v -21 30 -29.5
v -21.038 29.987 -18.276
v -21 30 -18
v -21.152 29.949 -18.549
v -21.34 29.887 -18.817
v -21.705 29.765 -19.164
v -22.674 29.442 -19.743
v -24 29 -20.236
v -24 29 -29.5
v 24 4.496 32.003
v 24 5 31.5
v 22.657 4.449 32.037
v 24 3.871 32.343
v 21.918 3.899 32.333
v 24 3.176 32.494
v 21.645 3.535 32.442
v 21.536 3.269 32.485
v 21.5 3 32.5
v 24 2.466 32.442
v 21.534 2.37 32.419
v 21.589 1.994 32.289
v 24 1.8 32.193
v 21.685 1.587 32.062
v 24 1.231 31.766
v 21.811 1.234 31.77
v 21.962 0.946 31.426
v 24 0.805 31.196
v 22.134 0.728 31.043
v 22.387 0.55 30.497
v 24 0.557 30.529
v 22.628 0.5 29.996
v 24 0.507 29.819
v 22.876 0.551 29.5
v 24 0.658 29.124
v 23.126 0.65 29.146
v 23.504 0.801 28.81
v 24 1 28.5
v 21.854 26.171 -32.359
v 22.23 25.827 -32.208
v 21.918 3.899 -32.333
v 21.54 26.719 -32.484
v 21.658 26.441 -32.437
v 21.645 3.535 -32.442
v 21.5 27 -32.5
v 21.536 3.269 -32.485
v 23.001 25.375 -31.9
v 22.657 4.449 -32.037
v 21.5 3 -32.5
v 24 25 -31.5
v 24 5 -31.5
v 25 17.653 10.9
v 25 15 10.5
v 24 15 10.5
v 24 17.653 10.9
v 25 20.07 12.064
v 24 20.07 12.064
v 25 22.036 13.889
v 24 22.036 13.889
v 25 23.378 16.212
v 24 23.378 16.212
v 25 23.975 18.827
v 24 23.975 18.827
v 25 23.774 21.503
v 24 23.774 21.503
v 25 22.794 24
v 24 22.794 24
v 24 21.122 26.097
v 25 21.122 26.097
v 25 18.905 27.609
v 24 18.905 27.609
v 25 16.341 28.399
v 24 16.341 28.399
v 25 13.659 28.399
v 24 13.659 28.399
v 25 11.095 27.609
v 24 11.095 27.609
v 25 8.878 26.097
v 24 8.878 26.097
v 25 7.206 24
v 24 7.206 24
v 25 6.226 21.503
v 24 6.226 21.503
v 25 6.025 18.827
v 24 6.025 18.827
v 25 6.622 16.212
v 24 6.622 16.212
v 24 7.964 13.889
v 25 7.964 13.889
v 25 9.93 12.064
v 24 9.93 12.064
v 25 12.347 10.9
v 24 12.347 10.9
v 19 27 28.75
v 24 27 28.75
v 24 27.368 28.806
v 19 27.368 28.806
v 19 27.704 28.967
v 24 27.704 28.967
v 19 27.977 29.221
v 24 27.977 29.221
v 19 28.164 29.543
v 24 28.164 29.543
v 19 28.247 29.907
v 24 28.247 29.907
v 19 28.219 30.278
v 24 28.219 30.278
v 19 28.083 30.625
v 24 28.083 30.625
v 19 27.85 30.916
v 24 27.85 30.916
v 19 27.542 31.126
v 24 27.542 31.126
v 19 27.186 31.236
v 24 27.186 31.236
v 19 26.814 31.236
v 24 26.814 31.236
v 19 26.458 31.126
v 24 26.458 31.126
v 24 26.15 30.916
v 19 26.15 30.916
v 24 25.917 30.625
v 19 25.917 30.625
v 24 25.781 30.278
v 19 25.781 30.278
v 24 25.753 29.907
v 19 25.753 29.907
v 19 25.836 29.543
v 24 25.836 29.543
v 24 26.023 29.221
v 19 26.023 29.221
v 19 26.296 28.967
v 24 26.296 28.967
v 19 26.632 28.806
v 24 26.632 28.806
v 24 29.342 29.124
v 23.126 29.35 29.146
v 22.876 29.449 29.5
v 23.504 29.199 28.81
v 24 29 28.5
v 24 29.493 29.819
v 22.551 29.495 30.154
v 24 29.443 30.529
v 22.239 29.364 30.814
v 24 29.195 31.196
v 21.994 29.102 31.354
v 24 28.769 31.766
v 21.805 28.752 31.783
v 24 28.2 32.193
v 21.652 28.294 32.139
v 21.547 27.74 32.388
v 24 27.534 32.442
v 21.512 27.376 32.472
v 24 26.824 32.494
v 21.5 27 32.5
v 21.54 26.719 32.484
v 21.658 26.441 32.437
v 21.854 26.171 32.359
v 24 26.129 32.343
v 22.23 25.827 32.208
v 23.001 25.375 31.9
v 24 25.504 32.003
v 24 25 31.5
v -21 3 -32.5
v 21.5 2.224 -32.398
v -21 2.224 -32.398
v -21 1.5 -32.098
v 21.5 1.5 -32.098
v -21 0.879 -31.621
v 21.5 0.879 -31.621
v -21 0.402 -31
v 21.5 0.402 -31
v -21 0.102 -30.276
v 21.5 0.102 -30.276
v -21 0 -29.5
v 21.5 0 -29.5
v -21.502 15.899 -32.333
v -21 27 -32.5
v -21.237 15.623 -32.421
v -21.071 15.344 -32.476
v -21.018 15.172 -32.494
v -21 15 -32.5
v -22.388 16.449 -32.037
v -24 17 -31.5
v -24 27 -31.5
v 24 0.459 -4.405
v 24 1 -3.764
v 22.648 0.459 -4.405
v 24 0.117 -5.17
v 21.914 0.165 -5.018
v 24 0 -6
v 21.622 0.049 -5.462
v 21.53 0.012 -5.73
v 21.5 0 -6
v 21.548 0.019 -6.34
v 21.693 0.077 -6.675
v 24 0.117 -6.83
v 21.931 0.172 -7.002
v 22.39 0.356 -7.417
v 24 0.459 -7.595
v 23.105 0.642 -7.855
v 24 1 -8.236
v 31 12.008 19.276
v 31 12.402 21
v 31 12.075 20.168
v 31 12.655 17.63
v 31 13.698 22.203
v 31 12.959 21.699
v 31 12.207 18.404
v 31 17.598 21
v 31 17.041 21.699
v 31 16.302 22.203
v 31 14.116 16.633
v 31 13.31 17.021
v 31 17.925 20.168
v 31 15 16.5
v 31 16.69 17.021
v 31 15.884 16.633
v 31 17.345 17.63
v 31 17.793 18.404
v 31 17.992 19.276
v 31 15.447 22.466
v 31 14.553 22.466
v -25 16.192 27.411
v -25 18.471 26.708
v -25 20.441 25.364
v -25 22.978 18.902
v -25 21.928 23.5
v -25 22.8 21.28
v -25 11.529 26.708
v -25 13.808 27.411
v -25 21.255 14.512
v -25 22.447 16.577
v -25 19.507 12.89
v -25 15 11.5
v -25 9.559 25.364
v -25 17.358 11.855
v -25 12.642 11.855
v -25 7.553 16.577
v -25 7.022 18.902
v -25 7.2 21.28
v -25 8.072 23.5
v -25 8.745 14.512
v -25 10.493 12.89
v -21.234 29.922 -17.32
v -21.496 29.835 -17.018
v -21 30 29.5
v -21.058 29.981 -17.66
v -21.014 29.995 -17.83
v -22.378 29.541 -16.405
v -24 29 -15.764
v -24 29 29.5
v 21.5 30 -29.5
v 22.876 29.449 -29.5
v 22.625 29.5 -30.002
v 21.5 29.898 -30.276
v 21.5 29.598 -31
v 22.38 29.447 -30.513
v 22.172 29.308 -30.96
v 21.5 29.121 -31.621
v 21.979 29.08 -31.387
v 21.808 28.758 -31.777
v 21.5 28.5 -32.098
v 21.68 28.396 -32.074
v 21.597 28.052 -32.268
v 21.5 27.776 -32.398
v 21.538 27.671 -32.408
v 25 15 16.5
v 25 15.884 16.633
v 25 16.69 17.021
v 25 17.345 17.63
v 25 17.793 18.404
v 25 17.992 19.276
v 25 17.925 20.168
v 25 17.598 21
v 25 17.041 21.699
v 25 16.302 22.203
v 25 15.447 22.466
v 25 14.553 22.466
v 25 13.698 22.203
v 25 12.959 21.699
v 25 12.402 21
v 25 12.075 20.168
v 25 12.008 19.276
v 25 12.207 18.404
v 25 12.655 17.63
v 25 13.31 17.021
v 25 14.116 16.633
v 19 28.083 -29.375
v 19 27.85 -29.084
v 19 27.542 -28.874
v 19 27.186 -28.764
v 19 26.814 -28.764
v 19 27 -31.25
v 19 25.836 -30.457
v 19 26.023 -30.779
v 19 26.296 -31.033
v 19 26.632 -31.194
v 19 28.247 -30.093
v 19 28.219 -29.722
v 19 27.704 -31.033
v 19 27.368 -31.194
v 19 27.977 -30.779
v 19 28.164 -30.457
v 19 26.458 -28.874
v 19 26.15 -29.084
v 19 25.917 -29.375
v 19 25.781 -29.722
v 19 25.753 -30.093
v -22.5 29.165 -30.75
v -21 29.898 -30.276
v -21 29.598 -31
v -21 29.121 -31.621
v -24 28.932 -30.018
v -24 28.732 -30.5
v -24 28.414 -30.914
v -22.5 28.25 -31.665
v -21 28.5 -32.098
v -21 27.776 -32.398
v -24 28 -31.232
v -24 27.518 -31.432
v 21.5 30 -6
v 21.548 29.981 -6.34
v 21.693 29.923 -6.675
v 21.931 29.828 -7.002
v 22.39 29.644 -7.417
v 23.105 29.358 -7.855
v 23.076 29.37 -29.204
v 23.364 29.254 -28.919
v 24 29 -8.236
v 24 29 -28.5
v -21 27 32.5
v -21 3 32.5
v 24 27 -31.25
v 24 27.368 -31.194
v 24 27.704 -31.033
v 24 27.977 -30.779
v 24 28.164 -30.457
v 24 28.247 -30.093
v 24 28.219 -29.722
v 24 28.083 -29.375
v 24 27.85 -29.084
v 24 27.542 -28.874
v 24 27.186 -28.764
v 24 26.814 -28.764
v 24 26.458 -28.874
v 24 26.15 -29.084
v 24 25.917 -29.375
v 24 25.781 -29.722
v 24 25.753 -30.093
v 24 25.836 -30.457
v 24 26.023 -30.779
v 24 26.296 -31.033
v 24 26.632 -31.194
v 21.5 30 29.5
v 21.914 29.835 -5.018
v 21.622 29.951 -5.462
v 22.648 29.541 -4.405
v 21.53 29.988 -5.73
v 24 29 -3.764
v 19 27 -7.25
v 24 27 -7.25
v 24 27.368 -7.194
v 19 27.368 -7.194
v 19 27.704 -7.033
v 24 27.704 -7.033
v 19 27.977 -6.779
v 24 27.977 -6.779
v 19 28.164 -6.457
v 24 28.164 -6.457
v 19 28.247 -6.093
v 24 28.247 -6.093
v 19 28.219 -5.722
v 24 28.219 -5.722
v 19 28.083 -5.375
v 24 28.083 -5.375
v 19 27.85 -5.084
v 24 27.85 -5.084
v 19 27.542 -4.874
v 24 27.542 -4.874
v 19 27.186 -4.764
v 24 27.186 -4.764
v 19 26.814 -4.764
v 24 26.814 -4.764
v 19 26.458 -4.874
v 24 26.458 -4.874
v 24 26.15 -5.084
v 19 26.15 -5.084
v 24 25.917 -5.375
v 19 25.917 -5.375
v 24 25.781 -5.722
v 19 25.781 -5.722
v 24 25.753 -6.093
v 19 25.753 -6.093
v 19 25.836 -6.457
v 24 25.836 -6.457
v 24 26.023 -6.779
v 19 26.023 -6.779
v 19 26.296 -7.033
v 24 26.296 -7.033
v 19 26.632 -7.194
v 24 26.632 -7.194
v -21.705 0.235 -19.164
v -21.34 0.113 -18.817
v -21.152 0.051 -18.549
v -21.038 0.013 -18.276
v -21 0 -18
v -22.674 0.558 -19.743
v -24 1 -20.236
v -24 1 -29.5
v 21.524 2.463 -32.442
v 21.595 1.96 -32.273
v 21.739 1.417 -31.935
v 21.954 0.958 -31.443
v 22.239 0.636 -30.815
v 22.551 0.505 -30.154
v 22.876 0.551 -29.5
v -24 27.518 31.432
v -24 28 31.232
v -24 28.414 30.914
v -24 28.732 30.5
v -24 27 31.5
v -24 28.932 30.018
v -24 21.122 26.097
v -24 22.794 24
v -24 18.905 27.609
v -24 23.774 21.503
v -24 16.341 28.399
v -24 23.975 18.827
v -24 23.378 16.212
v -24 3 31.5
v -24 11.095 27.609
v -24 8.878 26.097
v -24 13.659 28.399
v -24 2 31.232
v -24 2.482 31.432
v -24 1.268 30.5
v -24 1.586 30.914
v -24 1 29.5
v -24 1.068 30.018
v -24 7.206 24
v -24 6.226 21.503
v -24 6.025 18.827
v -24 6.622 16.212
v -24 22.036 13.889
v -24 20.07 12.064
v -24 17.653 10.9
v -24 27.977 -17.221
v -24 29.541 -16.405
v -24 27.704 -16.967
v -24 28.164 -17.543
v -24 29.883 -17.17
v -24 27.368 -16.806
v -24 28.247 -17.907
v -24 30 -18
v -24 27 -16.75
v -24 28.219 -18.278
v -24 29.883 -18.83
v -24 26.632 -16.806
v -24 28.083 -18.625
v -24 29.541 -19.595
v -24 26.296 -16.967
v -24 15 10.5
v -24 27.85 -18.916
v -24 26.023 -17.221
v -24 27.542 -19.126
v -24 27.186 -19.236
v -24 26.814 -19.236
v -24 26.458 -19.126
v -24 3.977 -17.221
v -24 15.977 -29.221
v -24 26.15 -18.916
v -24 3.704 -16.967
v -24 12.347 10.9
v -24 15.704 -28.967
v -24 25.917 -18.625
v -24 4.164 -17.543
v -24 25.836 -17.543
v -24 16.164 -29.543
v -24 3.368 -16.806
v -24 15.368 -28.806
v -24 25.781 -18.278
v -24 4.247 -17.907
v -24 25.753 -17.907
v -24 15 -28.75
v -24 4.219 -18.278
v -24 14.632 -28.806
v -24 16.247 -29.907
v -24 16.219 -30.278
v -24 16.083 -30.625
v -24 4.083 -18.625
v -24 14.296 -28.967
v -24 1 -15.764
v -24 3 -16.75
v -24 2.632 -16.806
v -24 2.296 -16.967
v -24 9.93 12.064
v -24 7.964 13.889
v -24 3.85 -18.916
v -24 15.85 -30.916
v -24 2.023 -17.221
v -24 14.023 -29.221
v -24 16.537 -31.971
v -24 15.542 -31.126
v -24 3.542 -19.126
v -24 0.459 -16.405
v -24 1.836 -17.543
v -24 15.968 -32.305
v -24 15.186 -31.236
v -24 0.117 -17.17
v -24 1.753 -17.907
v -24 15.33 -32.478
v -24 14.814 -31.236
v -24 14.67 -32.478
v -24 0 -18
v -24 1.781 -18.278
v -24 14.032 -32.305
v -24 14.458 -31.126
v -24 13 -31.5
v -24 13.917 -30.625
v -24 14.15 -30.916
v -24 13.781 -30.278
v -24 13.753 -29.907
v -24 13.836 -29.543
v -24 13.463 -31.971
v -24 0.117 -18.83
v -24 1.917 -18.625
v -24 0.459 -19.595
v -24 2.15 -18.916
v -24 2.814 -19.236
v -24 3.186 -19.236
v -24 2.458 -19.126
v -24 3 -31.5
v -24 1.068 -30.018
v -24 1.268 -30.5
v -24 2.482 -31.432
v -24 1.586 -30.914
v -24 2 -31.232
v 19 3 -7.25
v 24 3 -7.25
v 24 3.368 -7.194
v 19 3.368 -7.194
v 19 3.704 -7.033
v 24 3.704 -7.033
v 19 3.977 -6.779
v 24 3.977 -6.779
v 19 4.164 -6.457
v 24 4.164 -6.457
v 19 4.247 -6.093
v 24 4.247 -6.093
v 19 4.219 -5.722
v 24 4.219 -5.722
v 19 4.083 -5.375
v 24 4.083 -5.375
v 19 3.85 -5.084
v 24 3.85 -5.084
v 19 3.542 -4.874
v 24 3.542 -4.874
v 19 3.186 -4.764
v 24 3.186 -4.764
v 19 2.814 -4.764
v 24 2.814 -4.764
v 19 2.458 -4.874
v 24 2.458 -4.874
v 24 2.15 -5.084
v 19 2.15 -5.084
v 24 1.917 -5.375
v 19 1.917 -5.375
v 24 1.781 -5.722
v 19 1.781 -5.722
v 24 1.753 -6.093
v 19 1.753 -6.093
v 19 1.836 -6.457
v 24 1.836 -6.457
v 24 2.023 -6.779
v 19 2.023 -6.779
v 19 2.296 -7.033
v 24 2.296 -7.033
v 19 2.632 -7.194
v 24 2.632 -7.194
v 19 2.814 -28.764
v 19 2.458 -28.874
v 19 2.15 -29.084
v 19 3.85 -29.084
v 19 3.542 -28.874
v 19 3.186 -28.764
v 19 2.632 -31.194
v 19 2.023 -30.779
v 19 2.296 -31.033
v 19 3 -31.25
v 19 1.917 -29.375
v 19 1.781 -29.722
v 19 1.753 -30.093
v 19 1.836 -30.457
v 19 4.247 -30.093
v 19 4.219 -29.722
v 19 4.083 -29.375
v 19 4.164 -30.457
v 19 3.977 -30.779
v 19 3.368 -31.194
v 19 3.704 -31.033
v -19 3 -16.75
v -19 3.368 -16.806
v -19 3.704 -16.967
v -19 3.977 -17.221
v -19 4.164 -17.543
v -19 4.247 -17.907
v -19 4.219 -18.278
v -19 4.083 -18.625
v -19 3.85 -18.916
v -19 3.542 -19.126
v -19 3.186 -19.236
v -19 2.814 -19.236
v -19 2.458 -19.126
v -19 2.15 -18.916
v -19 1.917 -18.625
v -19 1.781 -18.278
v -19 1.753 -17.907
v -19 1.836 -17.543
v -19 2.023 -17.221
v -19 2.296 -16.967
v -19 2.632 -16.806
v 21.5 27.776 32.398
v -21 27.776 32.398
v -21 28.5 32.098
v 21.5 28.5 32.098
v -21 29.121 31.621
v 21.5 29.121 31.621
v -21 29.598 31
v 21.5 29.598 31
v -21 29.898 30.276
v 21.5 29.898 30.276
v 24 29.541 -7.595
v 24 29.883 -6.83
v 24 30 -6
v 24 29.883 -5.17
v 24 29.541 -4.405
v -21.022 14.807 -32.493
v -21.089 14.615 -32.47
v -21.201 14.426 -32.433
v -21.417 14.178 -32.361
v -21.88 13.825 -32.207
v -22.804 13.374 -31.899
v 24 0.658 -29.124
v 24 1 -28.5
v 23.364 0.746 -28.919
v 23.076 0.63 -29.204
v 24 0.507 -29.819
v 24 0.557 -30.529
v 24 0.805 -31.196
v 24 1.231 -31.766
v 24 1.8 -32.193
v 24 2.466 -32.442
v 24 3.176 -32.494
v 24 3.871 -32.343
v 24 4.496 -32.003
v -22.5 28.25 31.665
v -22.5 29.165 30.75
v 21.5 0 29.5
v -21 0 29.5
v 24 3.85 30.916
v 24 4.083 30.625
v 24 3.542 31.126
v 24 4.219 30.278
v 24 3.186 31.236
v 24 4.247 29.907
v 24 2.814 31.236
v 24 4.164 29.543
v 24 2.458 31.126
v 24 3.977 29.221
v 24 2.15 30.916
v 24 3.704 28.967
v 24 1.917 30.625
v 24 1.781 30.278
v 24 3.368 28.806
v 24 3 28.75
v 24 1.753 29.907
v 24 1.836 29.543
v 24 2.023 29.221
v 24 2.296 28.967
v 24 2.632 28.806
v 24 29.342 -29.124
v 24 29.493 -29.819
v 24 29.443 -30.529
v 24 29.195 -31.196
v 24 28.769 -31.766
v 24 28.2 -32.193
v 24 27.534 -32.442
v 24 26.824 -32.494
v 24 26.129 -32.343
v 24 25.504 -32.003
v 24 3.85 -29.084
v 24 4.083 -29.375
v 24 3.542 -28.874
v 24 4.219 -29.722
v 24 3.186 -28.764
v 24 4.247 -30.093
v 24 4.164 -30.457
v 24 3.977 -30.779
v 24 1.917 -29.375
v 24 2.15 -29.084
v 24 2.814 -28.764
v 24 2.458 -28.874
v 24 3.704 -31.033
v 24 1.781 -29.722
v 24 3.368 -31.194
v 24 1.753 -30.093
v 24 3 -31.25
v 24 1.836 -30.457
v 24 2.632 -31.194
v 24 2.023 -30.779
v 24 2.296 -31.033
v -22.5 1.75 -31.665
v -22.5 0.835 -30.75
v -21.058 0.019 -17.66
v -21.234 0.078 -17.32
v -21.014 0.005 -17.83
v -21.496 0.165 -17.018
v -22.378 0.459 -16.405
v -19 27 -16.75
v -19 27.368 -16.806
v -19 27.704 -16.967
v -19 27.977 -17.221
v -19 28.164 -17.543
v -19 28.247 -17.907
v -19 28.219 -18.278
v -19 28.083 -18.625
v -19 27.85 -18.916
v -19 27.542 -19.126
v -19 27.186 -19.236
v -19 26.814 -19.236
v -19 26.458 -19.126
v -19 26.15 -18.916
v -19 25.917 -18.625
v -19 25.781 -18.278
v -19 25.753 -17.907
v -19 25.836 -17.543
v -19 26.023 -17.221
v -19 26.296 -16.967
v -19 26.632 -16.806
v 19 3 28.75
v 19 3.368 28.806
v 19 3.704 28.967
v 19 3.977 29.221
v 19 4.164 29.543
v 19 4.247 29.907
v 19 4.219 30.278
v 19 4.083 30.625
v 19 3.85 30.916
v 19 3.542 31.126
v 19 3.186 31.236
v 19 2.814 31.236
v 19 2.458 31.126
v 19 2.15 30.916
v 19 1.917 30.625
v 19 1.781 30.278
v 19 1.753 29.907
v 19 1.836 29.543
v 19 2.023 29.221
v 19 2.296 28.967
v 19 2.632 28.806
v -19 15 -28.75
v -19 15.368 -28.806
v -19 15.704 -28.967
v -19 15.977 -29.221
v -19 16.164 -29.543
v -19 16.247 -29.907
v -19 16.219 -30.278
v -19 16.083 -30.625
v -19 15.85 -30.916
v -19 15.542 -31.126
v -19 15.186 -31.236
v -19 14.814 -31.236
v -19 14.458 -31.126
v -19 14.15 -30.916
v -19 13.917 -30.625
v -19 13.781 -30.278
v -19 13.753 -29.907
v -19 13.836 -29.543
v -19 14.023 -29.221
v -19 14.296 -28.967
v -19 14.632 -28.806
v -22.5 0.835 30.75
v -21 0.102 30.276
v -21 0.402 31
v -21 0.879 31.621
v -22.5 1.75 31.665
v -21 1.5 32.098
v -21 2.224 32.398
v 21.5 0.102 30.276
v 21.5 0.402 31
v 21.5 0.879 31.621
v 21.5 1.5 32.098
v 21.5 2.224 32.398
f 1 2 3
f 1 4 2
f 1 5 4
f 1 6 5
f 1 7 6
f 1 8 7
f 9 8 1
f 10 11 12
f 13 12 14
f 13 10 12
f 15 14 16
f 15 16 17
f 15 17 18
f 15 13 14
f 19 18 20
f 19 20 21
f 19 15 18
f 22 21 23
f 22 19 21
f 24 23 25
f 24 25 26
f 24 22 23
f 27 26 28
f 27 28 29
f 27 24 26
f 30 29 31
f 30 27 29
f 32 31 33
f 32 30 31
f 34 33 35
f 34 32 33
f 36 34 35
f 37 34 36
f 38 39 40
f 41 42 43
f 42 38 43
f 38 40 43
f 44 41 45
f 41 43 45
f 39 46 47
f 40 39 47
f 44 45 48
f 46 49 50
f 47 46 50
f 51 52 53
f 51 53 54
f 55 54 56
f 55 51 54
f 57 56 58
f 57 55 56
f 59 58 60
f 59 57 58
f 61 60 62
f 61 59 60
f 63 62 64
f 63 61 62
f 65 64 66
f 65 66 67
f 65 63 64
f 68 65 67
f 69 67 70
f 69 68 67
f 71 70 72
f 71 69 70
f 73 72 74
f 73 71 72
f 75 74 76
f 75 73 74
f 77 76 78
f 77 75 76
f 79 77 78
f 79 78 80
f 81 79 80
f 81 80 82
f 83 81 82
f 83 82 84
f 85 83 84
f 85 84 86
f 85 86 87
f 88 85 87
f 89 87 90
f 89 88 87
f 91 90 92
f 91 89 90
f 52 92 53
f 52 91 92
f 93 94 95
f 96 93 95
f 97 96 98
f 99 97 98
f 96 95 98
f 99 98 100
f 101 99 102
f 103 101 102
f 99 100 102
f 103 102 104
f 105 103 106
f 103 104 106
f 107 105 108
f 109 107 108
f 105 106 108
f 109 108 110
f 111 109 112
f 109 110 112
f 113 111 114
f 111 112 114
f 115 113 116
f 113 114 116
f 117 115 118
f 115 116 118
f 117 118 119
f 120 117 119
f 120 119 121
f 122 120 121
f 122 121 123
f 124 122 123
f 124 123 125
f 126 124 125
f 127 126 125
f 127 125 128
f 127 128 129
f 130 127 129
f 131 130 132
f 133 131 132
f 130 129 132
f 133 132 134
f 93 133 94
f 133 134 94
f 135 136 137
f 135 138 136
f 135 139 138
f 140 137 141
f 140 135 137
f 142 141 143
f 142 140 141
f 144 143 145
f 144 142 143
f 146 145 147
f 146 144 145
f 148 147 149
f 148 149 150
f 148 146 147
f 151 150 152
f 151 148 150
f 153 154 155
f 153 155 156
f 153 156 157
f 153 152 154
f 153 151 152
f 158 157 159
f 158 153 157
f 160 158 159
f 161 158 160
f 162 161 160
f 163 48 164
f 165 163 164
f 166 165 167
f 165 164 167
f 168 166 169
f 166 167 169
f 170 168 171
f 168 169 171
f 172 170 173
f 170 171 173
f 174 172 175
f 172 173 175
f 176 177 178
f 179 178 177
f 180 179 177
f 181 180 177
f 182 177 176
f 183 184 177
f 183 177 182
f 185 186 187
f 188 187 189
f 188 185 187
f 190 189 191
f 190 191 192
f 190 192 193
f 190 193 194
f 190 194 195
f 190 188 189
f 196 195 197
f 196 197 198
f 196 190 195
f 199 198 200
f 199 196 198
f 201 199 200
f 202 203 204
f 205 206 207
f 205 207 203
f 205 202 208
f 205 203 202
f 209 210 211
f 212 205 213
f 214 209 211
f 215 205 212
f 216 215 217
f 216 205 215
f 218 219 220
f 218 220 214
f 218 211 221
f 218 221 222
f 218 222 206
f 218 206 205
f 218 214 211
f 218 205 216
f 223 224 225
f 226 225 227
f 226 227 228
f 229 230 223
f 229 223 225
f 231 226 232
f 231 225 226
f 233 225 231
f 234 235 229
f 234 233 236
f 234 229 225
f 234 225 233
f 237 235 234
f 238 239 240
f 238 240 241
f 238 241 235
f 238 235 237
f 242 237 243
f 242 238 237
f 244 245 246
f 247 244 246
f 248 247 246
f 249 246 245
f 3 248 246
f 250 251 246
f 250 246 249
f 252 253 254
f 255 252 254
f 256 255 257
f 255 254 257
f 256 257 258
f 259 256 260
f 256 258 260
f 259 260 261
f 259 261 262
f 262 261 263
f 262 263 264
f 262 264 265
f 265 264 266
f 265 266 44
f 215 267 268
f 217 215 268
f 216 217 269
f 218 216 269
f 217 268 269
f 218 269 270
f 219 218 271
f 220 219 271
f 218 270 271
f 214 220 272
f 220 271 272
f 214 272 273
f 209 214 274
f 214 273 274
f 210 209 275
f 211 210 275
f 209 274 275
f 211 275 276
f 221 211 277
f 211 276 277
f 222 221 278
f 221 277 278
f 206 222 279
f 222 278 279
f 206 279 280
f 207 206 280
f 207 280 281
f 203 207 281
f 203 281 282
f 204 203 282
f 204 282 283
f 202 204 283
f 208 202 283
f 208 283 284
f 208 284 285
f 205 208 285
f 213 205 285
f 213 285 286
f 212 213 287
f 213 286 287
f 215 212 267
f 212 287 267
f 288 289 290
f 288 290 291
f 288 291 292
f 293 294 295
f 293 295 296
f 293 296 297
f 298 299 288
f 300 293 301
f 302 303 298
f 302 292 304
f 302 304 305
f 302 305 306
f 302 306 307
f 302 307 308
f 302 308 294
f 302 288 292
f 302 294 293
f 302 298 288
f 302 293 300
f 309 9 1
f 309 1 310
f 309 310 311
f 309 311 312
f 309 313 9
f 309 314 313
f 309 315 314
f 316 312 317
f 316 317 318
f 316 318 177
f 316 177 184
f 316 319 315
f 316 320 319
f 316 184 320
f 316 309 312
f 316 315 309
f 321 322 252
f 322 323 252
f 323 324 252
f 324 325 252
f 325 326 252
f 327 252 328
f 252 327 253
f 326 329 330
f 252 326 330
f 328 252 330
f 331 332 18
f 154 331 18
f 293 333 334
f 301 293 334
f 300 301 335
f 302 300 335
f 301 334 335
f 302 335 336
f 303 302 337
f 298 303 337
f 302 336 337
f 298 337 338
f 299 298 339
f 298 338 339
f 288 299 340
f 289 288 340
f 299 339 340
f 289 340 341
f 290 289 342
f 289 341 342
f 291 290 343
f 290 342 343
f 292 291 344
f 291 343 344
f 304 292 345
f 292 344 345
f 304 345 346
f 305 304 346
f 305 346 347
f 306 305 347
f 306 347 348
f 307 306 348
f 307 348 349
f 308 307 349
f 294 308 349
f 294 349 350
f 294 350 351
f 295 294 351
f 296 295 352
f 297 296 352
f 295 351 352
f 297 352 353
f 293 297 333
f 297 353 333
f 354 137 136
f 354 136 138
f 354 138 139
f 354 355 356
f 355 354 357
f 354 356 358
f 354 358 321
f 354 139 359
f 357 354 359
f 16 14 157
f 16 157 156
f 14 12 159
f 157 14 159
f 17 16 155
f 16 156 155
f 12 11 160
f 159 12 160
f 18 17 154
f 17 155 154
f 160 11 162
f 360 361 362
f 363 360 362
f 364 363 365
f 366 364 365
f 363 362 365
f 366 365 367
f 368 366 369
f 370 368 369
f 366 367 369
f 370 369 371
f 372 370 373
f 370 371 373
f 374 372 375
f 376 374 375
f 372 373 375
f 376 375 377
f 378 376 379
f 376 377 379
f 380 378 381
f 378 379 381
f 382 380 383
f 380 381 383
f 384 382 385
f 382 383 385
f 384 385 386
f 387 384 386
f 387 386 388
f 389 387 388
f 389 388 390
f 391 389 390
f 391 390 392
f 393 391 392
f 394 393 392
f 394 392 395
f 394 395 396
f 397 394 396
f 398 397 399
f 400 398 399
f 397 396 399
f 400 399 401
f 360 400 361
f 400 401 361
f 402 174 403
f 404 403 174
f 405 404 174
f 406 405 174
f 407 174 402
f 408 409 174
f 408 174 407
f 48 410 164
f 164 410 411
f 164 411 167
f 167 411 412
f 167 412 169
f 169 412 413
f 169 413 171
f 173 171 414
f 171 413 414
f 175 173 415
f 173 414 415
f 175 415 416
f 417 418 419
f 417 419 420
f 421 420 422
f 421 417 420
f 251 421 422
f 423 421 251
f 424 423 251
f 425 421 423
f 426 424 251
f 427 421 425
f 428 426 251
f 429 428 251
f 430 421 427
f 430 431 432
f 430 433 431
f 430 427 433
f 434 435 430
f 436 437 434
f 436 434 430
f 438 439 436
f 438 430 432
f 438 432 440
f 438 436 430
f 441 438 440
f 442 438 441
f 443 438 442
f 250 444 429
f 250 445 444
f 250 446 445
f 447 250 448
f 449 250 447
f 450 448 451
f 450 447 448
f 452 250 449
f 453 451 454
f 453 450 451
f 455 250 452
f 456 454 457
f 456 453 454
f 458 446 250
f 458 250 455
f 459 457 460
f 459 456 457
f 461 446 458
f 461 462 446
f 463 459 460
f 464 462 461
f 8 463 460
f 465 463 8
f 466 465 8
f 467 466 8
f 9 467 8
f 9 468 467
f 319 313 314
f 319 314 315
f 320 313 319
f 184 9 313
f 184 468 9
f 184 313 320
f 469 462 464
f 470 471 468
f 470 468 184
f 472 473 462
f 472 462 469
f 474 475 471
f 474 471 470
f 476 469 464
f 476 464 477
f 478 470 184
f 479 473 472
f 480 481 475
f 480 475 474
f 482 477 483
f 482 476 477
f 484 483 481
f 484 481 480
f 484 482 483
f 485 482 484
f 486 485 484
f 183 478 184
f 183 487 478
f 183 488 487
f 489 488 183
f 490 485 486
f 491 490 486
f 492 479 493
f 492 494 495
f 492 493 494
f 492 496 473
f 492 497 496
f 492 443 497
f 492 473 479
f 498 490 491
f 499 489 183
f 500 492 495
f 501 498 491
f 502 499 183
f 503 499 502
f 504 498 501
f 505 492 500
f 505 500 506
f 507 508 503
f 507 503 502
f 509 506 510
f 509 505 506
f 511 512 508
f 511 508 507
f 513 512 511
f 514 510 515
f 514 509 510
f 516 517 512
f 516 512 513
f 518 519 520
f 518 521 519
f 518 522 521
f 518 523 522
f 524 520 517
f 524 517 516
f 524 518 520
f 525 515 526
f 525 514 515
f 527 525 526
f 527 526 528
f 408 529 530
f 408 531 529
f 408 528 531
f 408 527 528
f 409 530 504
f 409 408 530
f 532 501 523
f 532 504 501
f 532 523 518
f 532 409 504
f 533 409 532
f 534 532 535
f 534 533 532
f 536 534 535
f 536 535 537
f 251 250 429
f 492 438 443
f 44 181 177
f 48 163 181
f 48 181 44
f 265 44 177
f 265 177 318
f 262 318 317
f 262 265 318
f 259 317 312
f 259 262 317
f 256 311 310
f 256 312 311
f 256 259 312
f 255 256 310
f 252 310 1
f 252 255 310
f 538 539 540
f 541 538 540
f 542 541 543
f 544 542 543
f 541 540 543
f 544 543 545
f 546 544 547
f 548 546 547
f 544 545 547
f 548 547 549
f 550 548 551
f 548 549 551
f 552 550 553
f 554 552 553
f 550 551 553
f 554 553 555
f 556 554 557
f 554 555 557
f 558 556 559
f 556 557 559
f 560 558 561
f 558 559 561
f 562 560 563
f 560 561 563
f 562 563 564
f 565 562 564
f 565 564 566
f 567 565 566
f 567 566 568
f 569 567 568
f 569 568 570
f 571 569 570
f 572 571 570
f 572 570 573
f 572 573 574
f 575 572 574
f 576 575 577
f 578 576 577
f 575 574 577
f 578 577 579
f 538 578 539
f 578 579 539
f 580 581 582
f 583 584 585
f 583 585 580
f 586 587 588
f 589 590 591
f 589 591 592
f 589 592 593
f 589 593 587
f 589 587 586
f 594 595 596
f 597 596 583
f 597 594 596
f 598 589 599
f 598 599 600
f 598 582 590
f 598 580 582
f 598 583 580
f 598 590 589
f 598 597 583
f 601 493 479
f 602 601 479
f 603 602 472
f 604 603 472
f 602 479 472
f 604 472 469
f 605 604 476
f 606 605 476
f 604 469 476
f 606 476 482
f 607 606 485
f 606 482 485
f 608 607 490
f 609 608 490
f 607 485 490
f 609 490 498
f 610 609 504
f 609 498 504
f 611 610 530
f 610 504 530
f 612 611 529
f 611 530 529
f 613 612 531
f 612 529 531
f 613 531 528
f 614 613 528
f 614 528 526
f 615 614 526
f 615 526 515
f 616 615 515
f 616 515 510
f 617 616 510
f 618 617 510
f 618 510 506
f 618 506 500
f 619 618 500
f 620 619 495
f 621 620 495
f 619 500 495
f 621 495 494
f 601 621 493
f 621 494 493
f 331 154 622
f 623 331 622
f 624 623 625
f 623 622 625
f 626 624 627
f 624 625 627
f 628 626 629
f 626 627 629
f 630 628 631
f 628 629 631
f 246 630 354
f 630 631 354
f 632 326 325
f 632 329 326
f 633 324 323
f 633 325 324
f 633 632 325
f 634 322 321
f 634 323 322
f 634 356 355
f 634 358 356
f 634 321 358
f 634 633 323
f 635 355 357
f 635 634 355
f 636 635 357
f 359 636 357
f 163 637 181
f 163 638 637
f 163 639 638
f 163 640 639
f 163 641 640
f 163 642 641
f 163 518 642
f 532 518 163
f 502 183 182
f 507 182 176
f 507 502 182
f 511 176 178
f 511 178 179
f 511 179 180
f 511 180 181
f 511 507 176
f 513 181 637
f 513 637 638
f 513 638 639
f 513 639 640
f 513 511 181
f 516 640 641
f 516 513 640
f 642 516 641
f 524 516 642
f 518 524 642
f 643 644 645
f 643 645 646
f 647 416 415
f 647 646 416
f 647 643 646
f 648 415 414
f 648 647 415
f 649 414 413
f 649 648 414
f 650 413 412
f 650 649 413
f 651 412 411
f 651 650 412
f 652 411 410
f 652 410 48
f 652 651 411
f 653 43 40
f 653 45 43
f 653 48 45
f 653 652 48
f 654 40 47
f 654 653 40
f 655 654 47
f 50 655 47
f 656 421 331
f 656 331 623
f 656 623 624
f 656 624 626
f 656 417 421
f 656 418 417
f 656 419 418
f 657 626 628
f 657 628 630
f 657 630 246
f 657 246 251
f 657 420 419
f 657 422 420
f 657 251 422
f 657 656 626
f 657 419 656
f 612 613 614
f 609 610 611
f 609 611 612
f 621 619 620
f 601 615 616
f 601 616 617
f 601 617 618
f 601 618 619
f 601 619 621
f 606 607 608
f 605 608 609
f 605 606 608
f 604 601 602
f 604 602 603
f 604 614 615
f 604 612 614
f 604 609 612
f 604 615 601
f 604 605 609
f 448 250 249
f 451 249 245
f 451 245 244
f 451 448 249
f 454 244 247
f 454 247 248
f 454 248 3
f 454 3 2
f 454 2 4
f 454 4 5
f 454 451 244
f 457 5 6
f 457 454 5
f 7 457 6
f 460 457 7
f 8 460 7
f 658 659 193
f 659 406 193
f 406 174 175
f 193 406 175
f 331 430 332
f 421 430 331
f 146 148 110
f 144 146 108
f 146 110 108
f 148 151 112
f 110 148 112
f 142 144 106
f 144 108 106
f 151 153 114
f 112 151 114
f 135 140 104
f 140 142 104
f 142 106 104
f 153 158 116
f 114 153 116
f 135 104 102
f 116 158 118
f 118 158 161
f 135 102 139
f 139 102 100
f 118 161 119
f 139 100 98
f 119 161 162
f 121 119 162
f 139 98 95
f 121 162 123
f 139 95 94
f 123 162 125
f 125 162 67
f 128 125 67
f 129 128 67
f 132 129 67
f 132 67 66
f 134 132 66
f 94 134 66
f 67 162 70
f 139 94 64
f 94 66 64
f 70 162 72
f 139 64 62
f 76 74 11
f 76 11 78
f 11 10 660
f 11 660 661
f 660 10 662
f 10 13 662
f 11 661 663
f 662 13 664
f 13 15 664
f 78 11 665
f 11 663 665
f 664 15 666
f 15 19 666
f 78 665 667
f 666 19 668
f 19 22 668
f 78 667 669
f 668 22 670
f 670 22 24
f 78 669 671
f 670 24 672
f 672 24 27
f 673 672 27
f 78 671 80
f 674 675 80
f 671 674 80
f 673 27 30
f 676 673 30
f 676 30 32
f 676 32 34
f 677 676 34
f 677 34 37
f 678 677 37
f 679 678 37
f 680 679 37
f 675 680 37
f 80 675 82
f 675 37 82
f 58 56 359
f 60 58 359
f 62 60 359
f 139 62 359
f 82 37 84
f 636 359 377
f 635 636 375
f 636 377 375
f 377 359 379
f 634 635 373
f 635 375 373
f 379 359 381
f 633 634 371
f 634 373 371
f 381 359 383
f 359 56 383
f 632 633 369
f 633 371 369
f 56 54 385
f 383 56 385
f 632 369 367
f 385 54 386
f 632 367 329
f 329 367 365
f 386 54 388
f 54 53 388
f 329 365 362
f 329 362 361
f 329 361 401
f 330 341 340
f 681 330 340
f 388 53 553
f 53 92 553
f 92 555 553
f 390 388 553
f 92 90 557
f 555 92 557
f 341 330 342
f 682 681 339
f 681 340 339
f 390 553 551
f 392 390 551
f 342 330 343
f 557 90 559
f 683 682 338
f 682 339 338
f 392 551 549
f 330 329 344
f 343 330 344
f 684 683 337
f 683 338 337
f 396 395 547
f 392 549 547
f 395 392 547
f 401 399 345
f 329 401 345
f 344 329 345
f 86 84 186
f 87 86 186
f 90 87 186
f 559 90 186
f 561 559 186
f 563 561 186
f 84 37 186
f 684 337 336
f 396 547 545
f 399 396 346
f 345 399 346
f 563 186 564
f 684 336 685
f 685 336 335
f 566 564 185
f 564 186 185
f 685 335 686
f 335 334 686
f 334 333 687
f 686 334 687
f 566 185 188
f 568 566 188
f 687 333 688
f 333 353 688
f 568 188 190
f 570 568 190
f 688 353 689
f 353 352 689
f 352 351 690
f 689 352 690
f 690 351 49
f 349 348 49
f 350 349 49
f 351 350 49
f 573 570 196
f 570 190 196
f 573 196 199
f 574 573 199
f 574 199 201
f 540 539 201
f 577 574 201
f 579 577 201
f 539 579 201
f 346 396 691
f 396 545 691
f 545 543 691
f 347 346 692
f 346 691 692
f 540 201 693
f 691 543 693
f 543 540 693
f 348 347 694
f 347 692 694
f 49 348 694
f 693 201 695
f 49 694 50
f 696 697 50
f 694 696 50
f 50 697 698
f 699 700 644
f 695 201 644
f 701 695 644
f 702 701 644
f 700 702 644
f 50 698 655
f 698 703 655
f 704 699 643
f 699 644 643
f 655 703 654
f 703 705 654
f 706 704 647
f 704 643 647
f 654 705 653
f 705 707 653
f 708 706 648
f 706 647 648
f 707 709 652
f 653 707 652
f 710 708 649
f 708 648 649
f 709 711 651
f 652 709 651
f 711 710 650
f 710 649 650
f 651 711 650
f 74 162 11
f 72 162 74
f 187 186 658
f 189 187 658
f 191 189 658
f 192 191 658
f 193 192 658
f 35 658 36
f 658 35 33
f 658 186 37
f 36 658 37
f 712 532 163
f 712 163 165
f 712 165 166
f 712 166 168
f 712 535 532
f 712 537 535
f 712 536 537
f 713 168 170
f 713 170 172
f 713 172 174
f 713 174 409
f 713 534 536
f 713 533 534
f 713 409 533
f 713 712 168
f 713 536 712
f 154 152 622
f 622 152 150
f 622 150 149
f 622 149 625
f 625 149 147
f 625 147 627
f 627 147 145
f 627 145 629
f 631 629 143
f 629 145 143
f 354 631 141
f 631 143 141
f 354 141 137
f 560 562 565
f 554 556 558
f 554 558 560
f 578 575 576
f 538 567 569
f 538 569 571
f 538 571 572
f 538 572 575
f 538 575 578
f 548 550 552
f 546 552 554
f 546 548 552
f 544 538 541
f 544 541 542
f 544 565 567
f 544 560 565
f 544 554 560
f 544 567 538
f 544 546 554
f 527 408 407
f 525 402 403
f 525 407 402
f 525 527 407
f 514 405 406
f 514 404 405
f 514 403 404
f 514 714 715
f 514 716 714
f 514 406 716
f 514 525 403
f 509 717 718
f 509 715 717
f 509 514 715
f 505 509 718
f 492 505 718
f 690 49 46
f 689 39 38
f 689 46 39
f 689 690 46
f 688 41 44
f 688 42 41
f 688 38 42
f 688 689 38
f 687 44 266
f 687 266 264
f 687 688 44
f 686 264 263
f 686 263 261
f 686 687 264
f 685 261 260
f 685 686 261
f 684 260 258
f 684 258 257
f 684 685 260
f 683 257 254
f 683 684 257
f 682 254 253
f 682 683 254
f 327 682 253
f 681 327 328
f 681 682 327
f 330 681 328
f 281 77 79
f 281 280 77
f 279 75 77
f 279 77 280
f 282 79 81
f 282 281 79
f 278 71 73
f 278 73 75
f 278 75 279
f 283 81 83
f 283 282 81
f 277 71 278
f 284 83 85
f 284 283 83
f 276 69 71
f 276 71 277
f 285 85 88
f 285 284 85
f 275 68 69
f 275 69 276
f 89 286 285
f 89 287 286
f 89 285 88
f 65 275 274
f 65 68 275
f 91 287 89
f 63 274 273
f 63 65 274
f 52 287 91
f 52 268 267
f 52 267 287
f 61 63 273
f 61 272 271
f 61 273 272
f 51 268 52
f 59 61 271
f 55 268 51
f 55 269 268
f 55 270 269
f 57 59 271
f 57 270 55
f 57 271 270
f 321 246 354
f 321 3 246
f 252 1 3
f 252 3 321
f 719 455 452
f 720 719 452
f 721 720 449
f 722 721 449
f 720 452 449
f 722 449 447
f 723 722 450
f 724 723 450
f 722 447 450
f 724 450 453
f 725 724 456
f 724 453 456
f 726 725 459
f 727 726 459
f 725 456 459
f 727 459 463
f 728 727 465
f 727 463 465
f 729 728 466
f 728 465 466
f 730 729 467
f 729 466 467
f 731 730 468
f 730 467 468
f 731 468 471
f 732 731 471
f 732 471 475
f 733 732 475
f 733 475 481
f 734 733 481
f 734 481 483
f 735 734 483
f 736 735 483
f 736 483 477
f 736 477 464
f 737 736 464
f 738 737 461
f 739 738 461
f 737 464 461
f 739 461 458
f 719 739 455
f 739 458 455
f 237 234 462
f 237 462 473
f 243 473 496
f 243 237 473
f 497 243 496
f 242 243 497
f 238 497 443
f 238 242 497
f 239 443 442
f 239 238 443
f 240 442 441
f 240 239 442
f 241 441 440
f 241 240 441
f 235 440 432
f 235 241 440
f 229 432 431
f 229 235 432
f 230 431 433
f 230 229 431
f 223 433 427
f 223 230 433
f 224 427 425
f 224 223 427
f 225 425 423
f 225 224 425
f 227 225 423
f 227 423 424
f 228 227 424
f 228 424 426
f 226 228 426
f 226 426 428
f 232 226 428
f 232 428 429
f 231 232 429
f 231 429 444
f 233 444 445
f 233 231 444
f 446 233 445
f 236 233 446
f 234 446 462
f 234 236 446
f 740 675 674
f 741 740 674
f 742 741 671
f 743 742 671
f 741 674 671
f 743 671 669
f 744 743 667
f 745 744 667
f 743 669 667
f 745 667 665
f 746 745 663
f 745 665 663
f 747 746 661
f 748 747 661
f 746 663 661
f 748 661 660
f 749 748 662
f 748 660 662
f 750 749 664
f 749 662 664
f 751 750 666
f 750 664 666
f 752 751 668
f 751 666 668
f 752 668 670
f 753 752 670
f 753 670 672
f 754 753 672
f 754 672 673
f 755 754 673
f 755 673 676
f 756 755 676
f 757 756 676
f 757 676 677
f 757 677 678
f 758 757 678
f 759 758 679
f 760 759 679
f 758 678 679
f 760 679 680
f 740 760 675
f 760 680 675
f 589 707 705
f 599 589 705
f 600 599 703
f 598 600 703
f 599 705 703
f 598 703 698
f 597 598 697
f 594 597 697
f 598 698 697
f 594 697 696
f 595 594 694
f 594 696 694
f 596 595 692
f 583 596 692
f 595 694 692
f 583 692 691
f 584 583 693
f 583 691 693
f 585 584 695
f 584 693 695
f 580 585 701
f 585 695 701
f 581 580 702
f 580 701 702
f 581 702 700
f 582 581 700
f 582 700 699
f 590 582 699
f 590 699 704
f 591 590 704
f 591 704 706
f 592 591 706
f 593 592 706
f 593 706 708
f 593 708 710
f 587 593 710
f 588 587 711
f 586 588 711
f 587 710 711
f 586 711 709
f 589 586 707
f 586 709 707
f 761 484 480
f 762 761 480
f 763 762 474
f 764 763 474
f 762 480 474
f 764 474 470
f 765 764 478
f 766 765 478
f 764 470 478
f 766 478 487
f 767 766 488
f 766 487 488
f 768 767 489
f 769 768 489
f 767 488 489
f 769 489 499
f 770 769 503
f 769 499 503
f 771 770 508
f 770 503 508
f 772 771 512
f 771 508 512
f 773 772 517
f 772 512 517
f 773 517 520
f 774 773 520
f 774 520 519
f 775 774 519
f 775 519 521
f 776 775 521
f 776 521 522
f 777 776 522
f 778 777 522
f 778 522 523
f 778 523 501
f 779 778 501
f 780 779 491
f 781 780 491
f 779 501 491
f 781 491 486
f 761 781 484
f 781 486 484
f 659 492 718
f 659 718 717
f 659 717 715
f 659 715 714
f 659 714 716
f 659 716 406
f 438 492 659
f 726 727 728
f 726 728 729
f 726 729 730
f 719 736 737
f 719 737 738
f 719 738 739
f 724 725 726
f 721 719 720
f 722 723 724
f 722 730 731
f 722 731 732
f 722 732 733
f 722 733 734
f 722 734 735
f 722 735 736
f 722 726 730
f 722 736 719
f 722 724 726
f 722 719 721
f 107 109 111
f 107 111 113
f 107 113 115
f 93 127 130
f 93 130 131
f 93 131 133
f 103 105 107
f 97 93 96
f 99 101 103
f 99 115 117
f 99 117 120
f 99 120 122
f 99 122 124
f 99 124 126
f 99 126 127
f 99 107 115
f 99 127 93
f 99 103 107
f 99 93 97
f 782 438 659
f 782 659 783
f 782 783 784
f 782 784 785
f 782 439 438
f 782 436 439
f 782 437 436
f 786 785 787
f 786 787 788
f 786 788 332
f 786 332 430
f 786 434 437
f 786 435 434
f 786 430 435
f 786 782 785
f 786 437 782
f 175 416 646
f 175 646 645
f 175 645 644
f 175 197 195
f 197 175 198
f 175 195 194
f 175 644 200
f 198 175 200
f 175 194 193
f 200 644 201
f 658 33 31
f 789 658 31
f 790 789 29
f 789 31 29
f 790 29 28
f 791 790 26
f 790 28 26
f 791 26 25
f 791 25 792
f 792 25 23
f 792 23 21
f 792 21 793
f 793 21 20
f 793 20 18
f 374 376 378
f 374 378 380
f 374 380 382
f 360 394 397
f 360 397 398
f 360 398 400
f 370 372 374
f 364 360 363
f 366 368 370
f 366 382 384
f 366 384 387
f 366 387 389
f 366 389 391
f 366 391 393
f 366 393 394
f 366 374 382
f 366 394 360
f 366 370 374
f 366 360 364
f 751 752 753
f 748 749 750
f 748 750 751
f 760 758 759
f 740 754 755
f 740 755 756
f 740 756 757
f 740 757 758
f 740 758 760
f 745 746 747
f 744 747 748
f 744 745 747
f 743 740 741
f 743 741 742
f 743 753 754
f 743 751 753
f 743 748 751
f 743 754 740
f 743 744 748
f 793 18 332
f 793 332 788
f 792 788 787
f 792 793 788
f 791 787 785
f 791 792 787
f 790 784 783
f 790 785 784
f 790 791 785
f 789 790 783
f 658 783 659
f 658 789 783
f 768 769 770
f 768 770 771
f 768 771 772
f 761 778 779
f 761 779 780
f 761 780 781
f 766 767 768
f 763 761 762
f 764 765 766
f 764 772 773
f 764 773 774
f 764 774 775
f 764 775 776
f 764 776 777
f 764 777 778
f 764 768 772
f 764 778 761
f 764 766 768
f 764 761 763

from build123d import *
from OCP.BRepFilletAPI import BRepFilletAPI_MakeChamfer

# Parameters (mm, degrees)
SKETCH1_W           = 48
SKETCH1_H           = 65
BOSS_EXTRUDE1_DEPTH = 30
FILLET2_R           = 3
SKETCH2_R           = 9
BOSS_EXTRUDE2_DEPTH = 1
BOSS_EXTRUDE4_START = 1
SKETCH4_R           = 9
BOSS_EXTRUDE4_DEPTH = 1
SKETCH5_R           = 3
BOSS_EXTRUDE5_DEPTH = 6
CHAMFER1_SIZE       = 3
CHAMFER1_SIZE2      = 1.000002977
CHAMFER2_SIZE       = 1
CHAMFER3_SIZE       = 2.5
CHAMFER3_SIZE2      = 0.99992866
SKETCH6_R           = 3
SKETCH6_R_2         = 2.5
BOSS_EXTRUDE6_DEPTH = 2.5
SKETCH7_R           = 2.500002977
SKETCH7_R_2         = 3
BOSS_EXTRUDE7_DEPTH = 3
SKETCH8_R           = 1.25
CUT_EXTRUDE1_DEPTH  = 5
SKETCH10_R          = 1.25
CUT_EXTRUDE2_DEPTH  = 5


with BuildPart() as part:
    # Sketch1 → Boss-Extrude1 (new body)
    with BuildSketch(Plane(origin=(0, 0, 0), x_dir=(1, 0, 0), z_dir=(0, 1, 0))):
        Rectangle(SKETCH1_W, SKETCH1_H)
    extrude(amount=BOSS_EXTRUDE1_DEPTH)

    # Fillet2
    fillet2_edges = [part.edges().sort_by_distance(p)[0] for p in [
        (0, 30, -32.5),
        (0, 0, -32.5),
        (0, 0, 32.5),
        (0, 30, 32.5),
    ]]
    fillet(fillet2_edges, radius=FILLET2_R)

    # Sketch2 → Boss-Extrude2 (add)
    with BuildSketch(Plane.ZY.offset(24)):
        with Locations(Location((19.5, 15, 0), (0, 0, 180))):
            Circle(SKETCH2_R)
    extrude(amount=BOSS_EXTRUDE2_DEPTH)

    # Sketch4 → Boss-Extrude4 (add)
    with BuildSketch(Plane(origin=(24, 0, 0), x_dir=(0, 0, -1), z_dir=(1, 0, 0)).offset(BOSS_EXTRUDE4_START)):
        with Locations((-19.5, 15)):
            Circle(SKETCH4_R)
    extrude(amount=-BOSS_EXTRUDE4_DEPTH)

    # Sketch5 → Boss-Extrude5 (add)
    with BuildSketch(Plane(origin=(25, 0, 0), x_dir=(0, 0, -1), z_dir=(1, 0, 0))):
        with Locations((-19.5, 15)):
            Circle(SKETCH5_R)
    extrude(amount=BOSS_EXTRUDE5_DEPTH)

    # Chamfer1: one chamfer whose edges measure the first distance from different faces: ONE call of the kernel's chamfer builder (chamfer() names one face for all edges)
    chamfer1_edges_1 = [part.edges().sort_by_distance(p)[0] for p in [
        (-24, 30, 0),
    ]]
    chamfer1_side_1 = [part.faces().sort_by_distance(p)[0] for p in [
        (0, 30, 0),
    ]]
    chamfer1_edges_2 = [part.edges().sort_by_distance(p)[0] for p in [
        (-24, 0, 0),
    ]]
    chamfer1_side_2 = [part.faces().sort_by_distance(p)[0] for p in [
        (0, 0, 0),
    ]]
    chamfer1_edges_3 = [part.edges().sort_by_distance(p)[0] for p in [
        (-24, 15, 32.5),
    ]]
    chamfer1_side_3 = [part.faces().sort_by_distance(p)[0] for p in [
        (0, 15, 32.5),
    ]]
    chamfer1_edges_4 = [part.edges().sort_by_distance(p)[0] for p in [
        (-24, 15, -32.5),
    ]]
    chamfer1_side_4 = [part.faces().sort_by_distance(p)[0] for p in [
        (0, 15, -32.5),
    ]]
    chamfer1_edges_5 = [part.edges().sort_by_distance(p)[0] for p in [
        (-24, 29.121320344, 31.621320344),
    ]]
    chamfer1_side_5 = [part.faces().sort_by_distance(p)[0] for p in [
        (0, 29.121320344, 31.621320344),
    ]]
    chamfer1_edges_6 = [part.edges().sort_by_distance(p)[0] for p in [
        (-24, 0.878679656, 31.621320344),
    ]]
    chamfer1_side_6 = [part.faces().sort_by_distance(p)[0] for p in [
        (0, 0.878679656, 31.621320344),
    ]]
    chamfer1_edges_7 = [part.edges().sort_by_distance(p)[0] for p in [
        (-24, 0.878679656, -31.621320344),
    ]]
    chamfer1_side_7 = [part.faces().sort_by_distance(p)[0] for p in [
        (0, 0.878679656, -31.621320344),
    ]]
    chamfer1_edges_8 = [part.edges().sort_by_distance(p)[0] for p in [
        (-24, 29.121320344, -31.621320344),
    ]]
    chamfer1_side_8 = [part.faces().sort_by_distance(p)[0] for p in [
        (0, 29.121320344, -31.621320344),
    ]]
    chamfer1 = BRepFilletAPI_MakeChamfer(part.part.solid().wrapped)
    for e in chamfer1_edges_1:
        chamfer1.Add(CHAMFER1_SIZE, CHAMFER1_SIZE2, e.wrapped, chamfer1_side_1[0].wrapped)  # the first distance lies on this face
    for e in chamfer1_edges_2:
        chamfer1.Add(CHAMFER1_SIZE, CHAMFER1_SIZE2, e.wrapped, chamfer1_side_2[0].wrapped)  # the first distance lies on this face
    for e in chamfer1_edges_3:
        chamfer1.Add(CHAMFER1_SIZE, CHAMFER1_SIZE2, e.wrapped, chamfer1_side_3[0].wrapped)  # the first distance lies on this face
    for e in chamfer1_edges_4:
        chamfer1.Add(CHAMFER1_SIZE, CHAMFER1_SIZE2, e.wrapped, chamfer1_side_4[0].wrapped)  # the first distance lies on this face
    for e in chamfer1_edges_5:
        chamfer1.Add(CHAMFER1_SIZE, CHAMFER1_SIZE2, e.wrapped, chamfer1_side_5[0].wrapped)  # the first distance lies on this face
    for e in chamfer1_edges_6:
        chamfer1.Add(CHAMFER1_SIZE, CHAMFER1_SIZE2, e.wrapped, chamfer1_side_6[0].wrapped)  # the first distance lies on this face
    for e in chamfer1_edges_7:
        chamfer1.Add(CHAMFER1_SIZE, CHAMFER1_SIZE2, e.wrapped, chamfer1_side_7[0].wrapped)  # the first distance lies on this face
    for e in chamfer1_edges_8:
        chamfer1.Add(CHAMFER1_SIZE, CHAMFER1_SIZE2, e.wrapped, chamfer1_side_8[0].wrapped)  # the first distance lies on this face
    add(Compound.cast(chamfer1.Shape()), mode=Mode.REPLACE)

    # Chamfer2
    chamfer2_edges = [part.edges().sort_by_distance(p)[0] for p in [
        (-25, 15, 28.5),
    ]]
    chamfer(chamfer2_edges, length=CHAMFER2_SIZE - 0.0001)  # a hair under: the kernel refuses the full size

    # Chamfer3: one chamfer whose edges measure the first distance from different faces: ONE call of the kernel's chamfer builder (chamfer() names one face for all edges)
    chamfer3_edges_1 = [part.edges().sort_by_distance(p)[0] for p in [
        (24, 30, 0),
    ]]
    chamfer3_side_1 = [part.faces().sort_by_distance(p)[0] for p in [
        (1.5, 30, 0),
    ]]
    chamfer3_edges_2 = [part.edges().sort_by_distance(p)[0] for p in [
        (24, 15, -32.5),
    ]]
    chamfer3_side_2 = [part.faces().sort_by_distance(p)[0] for p in [
        (1.5, 15, -32.5),
    ]]
    chamfer3_edges_3 = [part.edges().sort_by_distance(p)[0] for p in [
        (24, 0, 0),
    ]]
    chamfer3_side_3 = [part.faces().sort_by_distance(p)[0] for p in [
        (1.5, 0, 0),
    ]]
    chamfer3_edges_4 = [part.edges().sort_by_distance(p)[0] for p in [
        (24, 15, 32.5),
    ]]
    chamfer3_side_4 = [part.faces().sort_by_distance(p)[0] for p in [
        (1.5, 15, 32.5),
    ]]
    chamfer3_edges_5 = [part.edges().sort_by_distance(p)[0] for p in [
        (24, 29.121320344, 31.621320344),
    ]]
    chamfer3_side_5 = [part.faces().sort_by_distance(p)[0] for p in [
        (1.5, 29.121320344, 31.621320344),
    ]]
    chamfer3_edges_6 = [part.edges().sort_by_distance(p)[0] for p in [
        (24, 0.878679656, 31.621320344),
    ]]
    chamfer3_side_6 = [part.faces().sort_by_distance(p)[0] for p in [
        (1.5, 0.878679656, 31.621320344),
    ]]
    chamfer3_edges_7 = [part.edges().sort_by_distance(p)[0] for p in [
        (24, 0.878679656, -31.621320344),
    ]]
    chamfer3_side_7 = [part.faces().sort_by_distance(p)[0] for p in [
        (1.5, 0.878679656, -31.621320344),
    ]]
    chamfer3_edges_8 = [part.edges().sort_by_distance(p)[0] for p in [
        (24, 29.121320344, -31.621320344),
    ]]
    chamfer3_side_8 = [part.faces().sort_by_distance(p)[0] for p in [
        (1.5, 29.121320344, -31.621320344),
    ]]
    chamfer3 = BRepFilletAPI_MakeChamfer(part.part.solid().wrapped)
    for e in chamfer3_edges_1:
        chamfer3.Add(CHAMFER3_SIZE, CHAMFER3_SIZE2, e.wrapped, chamfer3_side_1[0].wrapped)  # the first distance lies on this face
    for e in chamfer3_edges_2:
        chamfer3.Add(CHAMFER3_SIZE, CHAMFER3_SIZE2, e.wrapped, chamfer3_side_2[0].wrapped)  # the first distance lies on this face
    for e in chamfer3_edges_3:
        chamfer3.Add(CHAMFER3_SIZE, CHAMFER3_SIZE2, e.wrapped, chamfer3_side_3[0].wrapped)  # the first distance lies on this face
    for e in chamfer3_edges_4:
        chamfer3.Add(CHAMFER3_SIZE, CHAMFER3_SIZE2, e.wrapped, chamfer3_side_4[0].wrapped)  # the first distance lies on this face
    for e in chamfer3_edges_5:
        chamfer3.Add(CHAMFER3_SIZE, CHAMFER3_SIZE2, e.wrapped, chamfer3_side_5[0].wrapped)  # the first distance lies on this face
    for e in chamfer3_edges_6:
        chamfer3.Add(CHAMFER3_SIZE, CHAMFER3_SIZE2, e.wrapped, chamfer3_side_6[0].wrapped)  # the first distance lies on this face
    for e in chamfer3_edges_7:
        chamfer3.Add(CHAMFER3_SIZE, CHAMFER3_SIZE2, e.wrapped, chamfer3_side_7[0].wrapped)  # the first distance lies on this face
    for e in chamfer3_edges_8:
        chamfer3.Add(CHAMFER3_SIZE, CHAMFER3_SIZE2, e.wrapped, chamfer3_side_8[0].wrapped)  # the first distance lies on this face
    add(Compound.cast(chamfer3.Shape()), mode=Mode.REPLACE)

    # Sketch6 → Boss-Extrude6 (add)
    with BuildSketch(Plane(origin=(24, 0, 0), x_dir=(0, 0, -1), z_dir=(1, 0, 0))):
        with Locations((6, 27)):
            Circle(SKETCH6_R)
        with Locations((6, 3)):
            Circle(SKETCH6_R)
        with Locations((-30, 3)):
            Circle(SKETCH6_R_2)
        with Locations((-30, 27)):
            Circle(SKETCH6_R_2)
        with Locations((30, 27)):
            Circle(SKETCH6_R_2)
        with Locations((30, 3)):
            Circle(SKETCH6_R_2)
    extrude(amount=-BOSS_EXTRUDE6_DEPTH)

    # Sketch7 → Boss-Extrude7 (add)
    with BuildSketch(Plane.ZY.offset(24)):
        with Locations((-29.999997023, 15)):
            Circle(SKETCH7_R)
        with Locations((-17.999997023, 3)):
            Circle(SKETCH7_R_2)
        with Locations((-17.999997023, 27)):
            Circle(SKETCH7_R_2)
    extrude(amount=-BOSS_EXTRUDE7_DEPTH)

    # Sketch8 → Cut-Extrude1 (cut)
    with BuildSketch(Plane.ZY.offset(24)):
        with Locations((-17.999997023, 27)):
            Circle(SKETCH8_R)
        with Locations((-29.999997023, 15)):
            Circle(SKETCH8_R)
        with Locations((-17.999997023, 3)):
            Circle(SKETCH8_R)
    extrude(amount=-CUT_EXTRUDE1_DEPTH, mode=Mode.SUBTRACT)

    # Sketch10 → Cut-Extrude2 (cut)
    with BuildSketch(Plane(origin=(24, 0, 0), x_dir=(0, 0, -1), z_dir=(1, 0, 0))):
        with Locations((6, 3)):
            Circle(SKETCH10_R)
        with Locations((30, 3)):
            Circle(SKETCH10_R)
        with Locations((6, 27)):
            Circle(SKETCH10_R)
        with Locations((30, 27)):
            Circle(SKETCH10_R)
        with Locations((-30, 3)):
            Circle(SKETCH10_R)
        with Locations((-30, 27)):
            Circle(SKETCH10_R)
    extrude(amount=-CUT_EXTRUDE2_DEPTH, mode=Mode.SUBTRACT)


solid = part.part
